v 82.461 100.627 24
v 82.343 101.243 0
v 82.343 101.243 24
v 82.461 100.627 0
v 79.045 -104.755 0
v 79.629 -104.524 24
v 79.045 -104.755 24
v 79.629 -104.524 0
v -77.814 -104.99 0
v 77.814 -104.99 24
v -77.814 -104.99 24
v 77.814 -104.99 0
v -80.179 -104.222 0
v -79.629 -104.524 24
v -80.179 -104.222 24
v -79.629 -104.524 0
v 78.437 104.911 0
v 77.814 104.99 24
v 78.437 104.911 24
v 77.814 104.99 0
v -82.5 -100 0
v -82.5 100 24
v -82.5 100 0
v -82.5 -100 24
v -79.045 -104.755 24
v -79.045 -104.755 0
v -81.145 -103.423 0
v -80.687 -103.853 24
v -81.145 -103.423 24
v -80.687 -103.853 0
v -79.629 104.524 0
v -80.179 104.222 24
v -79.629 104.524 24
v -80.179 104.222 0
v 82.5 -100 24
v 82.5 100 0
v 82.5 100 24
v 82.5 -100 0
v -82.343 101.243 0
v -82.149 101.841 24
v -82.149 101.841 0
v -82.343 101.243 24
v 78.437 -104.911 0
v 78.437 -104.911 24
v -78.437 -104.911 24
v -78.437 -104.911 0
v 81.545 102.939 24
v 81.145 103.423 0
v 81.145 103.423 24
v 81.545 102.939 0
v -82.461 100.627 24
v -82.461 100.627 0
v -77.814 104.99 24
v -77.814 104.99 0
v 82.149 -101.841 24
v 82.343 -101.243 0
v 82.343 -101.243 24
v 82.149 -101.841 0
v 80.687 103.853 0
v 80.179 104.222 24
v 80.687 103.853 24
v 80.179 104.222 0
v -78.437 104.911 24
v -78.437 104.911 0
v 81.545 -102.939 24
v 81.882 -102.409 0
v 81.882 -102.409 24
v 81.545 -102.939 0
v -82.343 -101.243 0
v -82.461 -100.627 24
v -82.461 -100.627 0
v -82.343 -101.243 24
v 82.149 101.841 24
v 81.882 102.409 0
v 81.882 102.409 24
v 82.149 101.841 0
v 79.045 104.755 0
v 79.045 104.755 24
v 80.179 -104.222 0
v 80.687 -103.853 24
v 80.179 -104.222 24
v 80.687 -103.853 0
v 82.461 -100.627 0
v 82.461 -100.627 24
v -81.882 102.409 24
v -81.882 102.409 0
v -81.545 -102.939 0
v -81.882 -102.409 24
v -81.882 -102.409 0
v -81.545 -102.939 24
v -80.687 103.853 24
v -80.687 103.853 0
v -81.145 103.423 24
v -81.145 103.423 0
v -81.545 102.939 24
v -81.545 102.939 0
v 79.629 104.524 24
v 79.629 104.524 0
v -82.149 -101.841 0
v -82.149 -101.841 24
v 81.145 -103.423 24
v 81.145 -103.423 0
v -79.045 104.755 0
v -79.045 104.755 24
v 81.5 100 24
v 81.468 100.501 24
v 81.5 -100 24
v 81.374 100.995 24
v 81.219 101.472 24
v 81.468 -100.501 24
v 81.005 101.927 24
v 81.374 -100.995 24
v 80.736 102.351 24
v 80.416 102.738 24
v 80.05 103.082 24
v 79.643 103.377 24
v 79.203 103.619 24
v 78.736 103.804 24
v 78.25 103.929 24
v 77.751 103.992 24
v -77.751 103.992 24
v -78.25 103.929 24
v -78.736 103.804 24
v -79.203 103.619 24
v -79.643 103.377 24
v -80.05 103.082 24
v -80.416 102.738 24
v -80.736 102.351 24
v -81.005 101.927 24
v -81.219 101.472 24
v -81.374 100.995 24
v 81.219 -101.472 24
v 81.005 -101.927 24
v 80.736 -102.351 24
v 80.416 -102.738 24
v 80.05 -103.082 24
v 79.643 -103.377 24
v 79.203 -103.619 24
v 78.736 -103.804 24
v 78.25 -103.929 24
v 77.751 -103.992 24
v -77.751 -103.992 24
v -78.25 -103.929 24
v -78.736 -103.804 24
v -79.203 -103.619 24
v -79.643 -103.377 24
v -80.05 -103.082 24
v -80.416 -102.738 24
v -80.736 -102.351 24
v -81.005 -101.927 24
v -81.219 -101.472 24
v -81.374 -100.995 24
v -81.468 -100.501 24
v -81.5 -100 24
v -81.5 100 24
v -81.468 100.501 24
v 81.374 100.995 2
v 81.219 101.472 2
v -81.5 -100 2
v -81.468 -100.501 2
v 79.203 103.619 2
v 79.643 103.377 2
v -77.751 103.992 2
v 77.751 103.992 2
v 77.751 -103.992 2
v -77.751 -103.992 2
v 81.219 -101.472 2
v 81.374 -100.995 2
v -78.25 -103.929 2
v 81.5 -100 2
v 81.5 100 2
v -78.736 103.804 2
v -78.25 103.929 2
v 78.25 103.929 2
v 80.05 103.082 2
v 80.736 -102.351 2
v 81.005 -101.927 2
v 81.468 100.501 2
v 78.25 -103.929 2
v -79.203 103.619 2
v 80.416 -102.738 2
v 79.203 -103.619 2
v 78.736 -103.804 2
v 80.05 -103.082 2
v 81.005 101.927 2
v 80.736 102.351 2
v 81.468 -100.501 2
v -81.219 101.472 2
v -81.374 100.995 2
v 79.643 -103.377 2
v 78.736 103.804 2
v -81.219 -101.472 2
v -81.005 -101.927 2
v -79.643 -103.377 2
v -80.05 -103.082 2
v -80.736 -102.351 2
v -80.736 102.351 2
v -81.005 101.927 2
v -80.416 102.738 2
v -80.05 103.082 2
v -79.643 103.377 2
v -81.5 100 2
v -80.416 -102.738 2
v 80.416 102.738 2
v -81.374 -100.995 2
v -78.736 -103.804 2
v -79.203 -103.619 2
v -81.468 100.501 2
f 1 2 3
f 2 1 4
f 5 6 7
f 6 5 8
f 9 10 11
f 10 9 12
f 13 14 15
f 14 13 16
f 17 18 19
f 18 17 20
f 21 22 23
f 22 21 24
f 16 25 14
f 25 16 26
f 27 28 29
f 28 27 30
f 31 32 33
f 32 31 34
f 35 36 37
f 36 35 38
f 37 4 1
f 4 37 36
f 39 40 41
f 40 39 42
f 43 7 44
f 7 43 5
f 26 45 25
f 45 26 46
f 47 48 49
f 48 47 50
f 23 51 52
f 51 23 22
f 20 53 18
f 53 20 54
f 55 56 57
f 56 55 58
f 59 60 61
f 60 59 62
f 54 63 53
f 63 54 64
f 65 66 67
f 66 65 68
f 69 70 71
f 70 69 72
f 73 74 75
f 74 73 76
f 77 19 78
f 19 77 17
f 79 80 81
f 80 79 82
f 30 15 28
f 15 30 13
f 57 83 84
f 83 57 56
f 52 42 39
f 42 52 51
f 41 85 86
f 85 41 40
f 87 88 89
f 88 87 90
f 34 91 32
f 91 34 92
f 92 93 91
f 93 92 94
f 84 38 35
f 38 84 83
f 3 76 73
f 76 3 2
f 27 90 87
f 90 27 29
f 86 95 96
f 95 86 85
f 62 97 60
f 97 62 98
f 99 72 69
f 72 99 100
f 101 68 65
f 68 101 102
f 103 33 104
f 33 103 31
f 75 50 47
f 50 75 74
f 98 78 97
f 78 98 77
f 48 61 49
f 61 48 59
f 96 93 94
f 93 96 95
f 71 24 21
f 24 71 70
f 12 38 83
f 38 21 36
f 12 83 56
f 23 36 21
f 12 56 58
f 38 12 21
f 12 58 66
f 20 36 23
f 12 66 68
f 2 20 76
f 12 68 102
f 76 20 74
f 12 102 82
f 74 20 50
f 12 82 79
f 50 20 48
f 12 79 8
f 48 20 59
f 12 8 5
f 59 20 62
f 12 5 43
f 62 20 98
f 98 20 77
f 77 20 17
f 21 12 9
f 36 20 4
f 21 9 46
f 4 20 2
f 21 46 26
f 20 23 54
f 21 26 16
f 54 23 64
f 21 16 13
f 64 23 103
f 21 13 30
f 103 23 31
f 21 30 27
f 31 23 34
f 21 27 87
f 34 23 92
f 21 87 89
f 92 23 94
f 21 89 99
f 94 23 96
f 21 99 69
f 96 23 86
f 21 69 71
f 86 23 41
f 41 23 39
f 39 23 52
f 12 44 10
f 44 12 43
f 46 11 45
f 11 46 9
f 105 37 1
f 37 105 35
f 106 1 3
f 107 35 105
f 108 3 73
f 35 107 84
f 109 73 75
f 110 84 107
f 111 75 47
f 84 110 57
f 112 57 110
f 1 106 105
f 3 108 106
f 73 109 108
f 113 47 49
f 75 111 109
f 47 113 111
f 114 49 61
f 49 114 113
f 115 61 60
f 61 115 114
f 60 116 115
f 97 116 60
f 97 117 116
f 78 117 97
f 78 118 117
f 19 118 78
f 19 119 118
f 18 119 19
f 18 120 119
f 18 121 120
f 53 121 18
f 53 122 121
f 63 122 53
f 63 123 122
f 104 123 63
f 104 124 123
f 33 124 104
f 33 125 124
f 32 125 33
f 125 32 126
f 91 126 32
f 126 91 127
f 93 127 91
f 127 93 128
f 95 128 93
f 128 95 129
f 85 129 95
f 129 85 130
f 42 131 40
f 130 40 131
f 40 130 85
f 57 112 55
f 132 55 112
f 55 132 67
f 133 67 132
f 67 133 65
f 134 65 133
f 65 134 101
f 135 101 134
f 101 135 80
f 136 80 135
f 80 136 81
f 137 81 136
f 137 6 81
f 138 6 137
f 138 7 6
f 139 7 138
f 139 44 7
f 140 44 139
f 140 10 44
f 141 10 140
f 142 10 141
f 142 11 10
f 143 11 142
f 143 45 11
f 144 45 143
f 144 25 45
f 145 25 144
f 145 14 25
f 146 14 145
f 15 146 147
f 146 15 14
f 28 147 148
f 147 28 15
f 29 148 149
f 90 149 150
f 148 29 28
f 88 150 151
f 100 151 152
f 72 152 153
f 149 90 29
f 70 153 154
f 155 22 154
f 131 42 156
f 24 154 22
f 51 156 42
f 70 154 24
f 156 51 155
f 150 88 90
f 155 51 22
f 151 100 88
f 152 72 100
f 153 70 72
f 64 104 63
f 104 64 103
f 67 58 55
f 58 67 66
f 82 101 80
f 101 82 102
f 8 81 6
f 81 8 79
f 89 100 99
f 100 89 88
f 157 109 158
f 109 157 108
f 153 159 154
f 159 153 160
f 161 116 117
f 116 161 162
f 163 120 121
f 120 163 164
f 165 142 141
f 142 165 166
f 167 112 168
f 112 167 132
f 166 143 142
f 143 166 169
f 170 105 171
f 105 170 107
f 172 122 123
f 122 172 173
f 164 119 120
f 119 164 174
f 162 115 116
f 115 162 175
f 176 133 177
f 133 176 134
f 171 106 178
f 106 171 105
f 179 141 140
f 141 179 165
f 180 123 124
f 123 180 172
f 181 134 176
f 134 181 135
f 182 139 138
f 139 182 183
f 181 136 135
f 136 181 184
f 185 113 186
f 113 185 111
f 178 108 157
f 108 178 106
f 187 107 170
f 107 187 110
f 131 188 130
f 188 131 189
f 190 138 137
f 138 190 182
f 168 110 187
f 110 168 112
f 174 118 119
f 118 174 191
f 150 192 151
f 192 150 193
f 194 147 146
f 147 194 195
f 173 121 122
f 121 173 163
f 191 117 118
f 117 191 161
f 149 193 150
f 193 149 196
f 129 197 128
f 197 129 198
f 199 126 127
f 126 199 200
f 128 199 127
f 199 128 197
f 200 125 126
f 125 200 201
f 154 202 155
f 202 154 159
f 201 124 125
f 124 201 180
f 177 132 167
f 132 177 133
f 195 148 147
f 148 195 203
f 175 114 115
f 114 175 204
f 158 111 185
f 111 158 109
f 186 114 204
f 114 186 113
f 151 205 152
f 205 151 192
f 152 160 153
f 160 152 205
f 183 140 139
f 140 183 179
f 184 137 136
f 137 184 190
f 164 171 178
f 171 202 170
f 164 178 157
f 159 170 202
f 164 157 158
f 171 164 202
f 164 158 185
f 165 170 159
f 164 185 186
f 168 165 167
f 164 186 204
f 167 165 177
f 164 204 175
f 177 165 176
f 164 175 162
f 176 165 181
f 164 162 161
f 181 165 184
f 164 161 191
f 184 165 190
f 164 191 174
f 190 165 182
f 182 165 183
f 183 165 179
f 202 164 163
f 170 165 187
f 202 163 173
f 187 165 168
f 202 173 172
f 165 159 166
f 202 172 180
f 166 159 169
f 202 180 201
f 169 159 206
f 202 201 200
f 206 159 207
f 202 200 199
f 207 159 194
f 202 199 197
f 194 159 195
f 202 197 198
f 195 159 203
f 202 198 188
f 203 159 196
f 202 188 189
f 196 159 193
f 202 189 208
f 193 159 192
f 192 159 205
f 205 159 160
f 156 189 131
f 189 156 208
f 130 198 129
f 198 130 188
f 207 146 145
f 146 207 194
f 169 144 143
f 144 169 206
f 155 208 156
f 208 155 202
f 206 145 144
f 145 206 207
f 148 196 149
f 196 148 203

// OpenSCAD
$fn = 50;


difference() {
	union() {
		hull() {
			translate(v = [-77.5000000000, 100.0000000000, 0]) {
				cylinder(h = 24, r = 5);
			}
			translate(v = [77.5000000000, 100.0000000000, 0]) {
				cylinder(h = 24, r = 5);
			}
			translate(v = [-77.5000000000, -100.0000000000, 0]) {
				cylinder(h = 24, r = 5);
			}
			translate(v = [77.5000000000, -100.0000000000, 0]) {
				cylinder(h = 24, r = 5);
			}
		}
	}
	union() {
		translate(v = [0, 0, 2]) {
			hull() {
				translate(v = [-77.5000000000, 100.0000000000, 0]) {
					cylinder(h = 22, r = 4);
				}
				translate(v = [77.5000000000, 100.0000000000, 0]) {
					cylinder(h = 22, r = 4);
				}
				translate(v = [-77.5000000000, -100.0000000000, 0]) {
					cylinder(h = 22, r = 4);
				}
				translate(v = [77.5000000000, -100.0000000000, 0]) {
					cylinder(h = 22, r = 4);
				}
			}
		}
	}
}
